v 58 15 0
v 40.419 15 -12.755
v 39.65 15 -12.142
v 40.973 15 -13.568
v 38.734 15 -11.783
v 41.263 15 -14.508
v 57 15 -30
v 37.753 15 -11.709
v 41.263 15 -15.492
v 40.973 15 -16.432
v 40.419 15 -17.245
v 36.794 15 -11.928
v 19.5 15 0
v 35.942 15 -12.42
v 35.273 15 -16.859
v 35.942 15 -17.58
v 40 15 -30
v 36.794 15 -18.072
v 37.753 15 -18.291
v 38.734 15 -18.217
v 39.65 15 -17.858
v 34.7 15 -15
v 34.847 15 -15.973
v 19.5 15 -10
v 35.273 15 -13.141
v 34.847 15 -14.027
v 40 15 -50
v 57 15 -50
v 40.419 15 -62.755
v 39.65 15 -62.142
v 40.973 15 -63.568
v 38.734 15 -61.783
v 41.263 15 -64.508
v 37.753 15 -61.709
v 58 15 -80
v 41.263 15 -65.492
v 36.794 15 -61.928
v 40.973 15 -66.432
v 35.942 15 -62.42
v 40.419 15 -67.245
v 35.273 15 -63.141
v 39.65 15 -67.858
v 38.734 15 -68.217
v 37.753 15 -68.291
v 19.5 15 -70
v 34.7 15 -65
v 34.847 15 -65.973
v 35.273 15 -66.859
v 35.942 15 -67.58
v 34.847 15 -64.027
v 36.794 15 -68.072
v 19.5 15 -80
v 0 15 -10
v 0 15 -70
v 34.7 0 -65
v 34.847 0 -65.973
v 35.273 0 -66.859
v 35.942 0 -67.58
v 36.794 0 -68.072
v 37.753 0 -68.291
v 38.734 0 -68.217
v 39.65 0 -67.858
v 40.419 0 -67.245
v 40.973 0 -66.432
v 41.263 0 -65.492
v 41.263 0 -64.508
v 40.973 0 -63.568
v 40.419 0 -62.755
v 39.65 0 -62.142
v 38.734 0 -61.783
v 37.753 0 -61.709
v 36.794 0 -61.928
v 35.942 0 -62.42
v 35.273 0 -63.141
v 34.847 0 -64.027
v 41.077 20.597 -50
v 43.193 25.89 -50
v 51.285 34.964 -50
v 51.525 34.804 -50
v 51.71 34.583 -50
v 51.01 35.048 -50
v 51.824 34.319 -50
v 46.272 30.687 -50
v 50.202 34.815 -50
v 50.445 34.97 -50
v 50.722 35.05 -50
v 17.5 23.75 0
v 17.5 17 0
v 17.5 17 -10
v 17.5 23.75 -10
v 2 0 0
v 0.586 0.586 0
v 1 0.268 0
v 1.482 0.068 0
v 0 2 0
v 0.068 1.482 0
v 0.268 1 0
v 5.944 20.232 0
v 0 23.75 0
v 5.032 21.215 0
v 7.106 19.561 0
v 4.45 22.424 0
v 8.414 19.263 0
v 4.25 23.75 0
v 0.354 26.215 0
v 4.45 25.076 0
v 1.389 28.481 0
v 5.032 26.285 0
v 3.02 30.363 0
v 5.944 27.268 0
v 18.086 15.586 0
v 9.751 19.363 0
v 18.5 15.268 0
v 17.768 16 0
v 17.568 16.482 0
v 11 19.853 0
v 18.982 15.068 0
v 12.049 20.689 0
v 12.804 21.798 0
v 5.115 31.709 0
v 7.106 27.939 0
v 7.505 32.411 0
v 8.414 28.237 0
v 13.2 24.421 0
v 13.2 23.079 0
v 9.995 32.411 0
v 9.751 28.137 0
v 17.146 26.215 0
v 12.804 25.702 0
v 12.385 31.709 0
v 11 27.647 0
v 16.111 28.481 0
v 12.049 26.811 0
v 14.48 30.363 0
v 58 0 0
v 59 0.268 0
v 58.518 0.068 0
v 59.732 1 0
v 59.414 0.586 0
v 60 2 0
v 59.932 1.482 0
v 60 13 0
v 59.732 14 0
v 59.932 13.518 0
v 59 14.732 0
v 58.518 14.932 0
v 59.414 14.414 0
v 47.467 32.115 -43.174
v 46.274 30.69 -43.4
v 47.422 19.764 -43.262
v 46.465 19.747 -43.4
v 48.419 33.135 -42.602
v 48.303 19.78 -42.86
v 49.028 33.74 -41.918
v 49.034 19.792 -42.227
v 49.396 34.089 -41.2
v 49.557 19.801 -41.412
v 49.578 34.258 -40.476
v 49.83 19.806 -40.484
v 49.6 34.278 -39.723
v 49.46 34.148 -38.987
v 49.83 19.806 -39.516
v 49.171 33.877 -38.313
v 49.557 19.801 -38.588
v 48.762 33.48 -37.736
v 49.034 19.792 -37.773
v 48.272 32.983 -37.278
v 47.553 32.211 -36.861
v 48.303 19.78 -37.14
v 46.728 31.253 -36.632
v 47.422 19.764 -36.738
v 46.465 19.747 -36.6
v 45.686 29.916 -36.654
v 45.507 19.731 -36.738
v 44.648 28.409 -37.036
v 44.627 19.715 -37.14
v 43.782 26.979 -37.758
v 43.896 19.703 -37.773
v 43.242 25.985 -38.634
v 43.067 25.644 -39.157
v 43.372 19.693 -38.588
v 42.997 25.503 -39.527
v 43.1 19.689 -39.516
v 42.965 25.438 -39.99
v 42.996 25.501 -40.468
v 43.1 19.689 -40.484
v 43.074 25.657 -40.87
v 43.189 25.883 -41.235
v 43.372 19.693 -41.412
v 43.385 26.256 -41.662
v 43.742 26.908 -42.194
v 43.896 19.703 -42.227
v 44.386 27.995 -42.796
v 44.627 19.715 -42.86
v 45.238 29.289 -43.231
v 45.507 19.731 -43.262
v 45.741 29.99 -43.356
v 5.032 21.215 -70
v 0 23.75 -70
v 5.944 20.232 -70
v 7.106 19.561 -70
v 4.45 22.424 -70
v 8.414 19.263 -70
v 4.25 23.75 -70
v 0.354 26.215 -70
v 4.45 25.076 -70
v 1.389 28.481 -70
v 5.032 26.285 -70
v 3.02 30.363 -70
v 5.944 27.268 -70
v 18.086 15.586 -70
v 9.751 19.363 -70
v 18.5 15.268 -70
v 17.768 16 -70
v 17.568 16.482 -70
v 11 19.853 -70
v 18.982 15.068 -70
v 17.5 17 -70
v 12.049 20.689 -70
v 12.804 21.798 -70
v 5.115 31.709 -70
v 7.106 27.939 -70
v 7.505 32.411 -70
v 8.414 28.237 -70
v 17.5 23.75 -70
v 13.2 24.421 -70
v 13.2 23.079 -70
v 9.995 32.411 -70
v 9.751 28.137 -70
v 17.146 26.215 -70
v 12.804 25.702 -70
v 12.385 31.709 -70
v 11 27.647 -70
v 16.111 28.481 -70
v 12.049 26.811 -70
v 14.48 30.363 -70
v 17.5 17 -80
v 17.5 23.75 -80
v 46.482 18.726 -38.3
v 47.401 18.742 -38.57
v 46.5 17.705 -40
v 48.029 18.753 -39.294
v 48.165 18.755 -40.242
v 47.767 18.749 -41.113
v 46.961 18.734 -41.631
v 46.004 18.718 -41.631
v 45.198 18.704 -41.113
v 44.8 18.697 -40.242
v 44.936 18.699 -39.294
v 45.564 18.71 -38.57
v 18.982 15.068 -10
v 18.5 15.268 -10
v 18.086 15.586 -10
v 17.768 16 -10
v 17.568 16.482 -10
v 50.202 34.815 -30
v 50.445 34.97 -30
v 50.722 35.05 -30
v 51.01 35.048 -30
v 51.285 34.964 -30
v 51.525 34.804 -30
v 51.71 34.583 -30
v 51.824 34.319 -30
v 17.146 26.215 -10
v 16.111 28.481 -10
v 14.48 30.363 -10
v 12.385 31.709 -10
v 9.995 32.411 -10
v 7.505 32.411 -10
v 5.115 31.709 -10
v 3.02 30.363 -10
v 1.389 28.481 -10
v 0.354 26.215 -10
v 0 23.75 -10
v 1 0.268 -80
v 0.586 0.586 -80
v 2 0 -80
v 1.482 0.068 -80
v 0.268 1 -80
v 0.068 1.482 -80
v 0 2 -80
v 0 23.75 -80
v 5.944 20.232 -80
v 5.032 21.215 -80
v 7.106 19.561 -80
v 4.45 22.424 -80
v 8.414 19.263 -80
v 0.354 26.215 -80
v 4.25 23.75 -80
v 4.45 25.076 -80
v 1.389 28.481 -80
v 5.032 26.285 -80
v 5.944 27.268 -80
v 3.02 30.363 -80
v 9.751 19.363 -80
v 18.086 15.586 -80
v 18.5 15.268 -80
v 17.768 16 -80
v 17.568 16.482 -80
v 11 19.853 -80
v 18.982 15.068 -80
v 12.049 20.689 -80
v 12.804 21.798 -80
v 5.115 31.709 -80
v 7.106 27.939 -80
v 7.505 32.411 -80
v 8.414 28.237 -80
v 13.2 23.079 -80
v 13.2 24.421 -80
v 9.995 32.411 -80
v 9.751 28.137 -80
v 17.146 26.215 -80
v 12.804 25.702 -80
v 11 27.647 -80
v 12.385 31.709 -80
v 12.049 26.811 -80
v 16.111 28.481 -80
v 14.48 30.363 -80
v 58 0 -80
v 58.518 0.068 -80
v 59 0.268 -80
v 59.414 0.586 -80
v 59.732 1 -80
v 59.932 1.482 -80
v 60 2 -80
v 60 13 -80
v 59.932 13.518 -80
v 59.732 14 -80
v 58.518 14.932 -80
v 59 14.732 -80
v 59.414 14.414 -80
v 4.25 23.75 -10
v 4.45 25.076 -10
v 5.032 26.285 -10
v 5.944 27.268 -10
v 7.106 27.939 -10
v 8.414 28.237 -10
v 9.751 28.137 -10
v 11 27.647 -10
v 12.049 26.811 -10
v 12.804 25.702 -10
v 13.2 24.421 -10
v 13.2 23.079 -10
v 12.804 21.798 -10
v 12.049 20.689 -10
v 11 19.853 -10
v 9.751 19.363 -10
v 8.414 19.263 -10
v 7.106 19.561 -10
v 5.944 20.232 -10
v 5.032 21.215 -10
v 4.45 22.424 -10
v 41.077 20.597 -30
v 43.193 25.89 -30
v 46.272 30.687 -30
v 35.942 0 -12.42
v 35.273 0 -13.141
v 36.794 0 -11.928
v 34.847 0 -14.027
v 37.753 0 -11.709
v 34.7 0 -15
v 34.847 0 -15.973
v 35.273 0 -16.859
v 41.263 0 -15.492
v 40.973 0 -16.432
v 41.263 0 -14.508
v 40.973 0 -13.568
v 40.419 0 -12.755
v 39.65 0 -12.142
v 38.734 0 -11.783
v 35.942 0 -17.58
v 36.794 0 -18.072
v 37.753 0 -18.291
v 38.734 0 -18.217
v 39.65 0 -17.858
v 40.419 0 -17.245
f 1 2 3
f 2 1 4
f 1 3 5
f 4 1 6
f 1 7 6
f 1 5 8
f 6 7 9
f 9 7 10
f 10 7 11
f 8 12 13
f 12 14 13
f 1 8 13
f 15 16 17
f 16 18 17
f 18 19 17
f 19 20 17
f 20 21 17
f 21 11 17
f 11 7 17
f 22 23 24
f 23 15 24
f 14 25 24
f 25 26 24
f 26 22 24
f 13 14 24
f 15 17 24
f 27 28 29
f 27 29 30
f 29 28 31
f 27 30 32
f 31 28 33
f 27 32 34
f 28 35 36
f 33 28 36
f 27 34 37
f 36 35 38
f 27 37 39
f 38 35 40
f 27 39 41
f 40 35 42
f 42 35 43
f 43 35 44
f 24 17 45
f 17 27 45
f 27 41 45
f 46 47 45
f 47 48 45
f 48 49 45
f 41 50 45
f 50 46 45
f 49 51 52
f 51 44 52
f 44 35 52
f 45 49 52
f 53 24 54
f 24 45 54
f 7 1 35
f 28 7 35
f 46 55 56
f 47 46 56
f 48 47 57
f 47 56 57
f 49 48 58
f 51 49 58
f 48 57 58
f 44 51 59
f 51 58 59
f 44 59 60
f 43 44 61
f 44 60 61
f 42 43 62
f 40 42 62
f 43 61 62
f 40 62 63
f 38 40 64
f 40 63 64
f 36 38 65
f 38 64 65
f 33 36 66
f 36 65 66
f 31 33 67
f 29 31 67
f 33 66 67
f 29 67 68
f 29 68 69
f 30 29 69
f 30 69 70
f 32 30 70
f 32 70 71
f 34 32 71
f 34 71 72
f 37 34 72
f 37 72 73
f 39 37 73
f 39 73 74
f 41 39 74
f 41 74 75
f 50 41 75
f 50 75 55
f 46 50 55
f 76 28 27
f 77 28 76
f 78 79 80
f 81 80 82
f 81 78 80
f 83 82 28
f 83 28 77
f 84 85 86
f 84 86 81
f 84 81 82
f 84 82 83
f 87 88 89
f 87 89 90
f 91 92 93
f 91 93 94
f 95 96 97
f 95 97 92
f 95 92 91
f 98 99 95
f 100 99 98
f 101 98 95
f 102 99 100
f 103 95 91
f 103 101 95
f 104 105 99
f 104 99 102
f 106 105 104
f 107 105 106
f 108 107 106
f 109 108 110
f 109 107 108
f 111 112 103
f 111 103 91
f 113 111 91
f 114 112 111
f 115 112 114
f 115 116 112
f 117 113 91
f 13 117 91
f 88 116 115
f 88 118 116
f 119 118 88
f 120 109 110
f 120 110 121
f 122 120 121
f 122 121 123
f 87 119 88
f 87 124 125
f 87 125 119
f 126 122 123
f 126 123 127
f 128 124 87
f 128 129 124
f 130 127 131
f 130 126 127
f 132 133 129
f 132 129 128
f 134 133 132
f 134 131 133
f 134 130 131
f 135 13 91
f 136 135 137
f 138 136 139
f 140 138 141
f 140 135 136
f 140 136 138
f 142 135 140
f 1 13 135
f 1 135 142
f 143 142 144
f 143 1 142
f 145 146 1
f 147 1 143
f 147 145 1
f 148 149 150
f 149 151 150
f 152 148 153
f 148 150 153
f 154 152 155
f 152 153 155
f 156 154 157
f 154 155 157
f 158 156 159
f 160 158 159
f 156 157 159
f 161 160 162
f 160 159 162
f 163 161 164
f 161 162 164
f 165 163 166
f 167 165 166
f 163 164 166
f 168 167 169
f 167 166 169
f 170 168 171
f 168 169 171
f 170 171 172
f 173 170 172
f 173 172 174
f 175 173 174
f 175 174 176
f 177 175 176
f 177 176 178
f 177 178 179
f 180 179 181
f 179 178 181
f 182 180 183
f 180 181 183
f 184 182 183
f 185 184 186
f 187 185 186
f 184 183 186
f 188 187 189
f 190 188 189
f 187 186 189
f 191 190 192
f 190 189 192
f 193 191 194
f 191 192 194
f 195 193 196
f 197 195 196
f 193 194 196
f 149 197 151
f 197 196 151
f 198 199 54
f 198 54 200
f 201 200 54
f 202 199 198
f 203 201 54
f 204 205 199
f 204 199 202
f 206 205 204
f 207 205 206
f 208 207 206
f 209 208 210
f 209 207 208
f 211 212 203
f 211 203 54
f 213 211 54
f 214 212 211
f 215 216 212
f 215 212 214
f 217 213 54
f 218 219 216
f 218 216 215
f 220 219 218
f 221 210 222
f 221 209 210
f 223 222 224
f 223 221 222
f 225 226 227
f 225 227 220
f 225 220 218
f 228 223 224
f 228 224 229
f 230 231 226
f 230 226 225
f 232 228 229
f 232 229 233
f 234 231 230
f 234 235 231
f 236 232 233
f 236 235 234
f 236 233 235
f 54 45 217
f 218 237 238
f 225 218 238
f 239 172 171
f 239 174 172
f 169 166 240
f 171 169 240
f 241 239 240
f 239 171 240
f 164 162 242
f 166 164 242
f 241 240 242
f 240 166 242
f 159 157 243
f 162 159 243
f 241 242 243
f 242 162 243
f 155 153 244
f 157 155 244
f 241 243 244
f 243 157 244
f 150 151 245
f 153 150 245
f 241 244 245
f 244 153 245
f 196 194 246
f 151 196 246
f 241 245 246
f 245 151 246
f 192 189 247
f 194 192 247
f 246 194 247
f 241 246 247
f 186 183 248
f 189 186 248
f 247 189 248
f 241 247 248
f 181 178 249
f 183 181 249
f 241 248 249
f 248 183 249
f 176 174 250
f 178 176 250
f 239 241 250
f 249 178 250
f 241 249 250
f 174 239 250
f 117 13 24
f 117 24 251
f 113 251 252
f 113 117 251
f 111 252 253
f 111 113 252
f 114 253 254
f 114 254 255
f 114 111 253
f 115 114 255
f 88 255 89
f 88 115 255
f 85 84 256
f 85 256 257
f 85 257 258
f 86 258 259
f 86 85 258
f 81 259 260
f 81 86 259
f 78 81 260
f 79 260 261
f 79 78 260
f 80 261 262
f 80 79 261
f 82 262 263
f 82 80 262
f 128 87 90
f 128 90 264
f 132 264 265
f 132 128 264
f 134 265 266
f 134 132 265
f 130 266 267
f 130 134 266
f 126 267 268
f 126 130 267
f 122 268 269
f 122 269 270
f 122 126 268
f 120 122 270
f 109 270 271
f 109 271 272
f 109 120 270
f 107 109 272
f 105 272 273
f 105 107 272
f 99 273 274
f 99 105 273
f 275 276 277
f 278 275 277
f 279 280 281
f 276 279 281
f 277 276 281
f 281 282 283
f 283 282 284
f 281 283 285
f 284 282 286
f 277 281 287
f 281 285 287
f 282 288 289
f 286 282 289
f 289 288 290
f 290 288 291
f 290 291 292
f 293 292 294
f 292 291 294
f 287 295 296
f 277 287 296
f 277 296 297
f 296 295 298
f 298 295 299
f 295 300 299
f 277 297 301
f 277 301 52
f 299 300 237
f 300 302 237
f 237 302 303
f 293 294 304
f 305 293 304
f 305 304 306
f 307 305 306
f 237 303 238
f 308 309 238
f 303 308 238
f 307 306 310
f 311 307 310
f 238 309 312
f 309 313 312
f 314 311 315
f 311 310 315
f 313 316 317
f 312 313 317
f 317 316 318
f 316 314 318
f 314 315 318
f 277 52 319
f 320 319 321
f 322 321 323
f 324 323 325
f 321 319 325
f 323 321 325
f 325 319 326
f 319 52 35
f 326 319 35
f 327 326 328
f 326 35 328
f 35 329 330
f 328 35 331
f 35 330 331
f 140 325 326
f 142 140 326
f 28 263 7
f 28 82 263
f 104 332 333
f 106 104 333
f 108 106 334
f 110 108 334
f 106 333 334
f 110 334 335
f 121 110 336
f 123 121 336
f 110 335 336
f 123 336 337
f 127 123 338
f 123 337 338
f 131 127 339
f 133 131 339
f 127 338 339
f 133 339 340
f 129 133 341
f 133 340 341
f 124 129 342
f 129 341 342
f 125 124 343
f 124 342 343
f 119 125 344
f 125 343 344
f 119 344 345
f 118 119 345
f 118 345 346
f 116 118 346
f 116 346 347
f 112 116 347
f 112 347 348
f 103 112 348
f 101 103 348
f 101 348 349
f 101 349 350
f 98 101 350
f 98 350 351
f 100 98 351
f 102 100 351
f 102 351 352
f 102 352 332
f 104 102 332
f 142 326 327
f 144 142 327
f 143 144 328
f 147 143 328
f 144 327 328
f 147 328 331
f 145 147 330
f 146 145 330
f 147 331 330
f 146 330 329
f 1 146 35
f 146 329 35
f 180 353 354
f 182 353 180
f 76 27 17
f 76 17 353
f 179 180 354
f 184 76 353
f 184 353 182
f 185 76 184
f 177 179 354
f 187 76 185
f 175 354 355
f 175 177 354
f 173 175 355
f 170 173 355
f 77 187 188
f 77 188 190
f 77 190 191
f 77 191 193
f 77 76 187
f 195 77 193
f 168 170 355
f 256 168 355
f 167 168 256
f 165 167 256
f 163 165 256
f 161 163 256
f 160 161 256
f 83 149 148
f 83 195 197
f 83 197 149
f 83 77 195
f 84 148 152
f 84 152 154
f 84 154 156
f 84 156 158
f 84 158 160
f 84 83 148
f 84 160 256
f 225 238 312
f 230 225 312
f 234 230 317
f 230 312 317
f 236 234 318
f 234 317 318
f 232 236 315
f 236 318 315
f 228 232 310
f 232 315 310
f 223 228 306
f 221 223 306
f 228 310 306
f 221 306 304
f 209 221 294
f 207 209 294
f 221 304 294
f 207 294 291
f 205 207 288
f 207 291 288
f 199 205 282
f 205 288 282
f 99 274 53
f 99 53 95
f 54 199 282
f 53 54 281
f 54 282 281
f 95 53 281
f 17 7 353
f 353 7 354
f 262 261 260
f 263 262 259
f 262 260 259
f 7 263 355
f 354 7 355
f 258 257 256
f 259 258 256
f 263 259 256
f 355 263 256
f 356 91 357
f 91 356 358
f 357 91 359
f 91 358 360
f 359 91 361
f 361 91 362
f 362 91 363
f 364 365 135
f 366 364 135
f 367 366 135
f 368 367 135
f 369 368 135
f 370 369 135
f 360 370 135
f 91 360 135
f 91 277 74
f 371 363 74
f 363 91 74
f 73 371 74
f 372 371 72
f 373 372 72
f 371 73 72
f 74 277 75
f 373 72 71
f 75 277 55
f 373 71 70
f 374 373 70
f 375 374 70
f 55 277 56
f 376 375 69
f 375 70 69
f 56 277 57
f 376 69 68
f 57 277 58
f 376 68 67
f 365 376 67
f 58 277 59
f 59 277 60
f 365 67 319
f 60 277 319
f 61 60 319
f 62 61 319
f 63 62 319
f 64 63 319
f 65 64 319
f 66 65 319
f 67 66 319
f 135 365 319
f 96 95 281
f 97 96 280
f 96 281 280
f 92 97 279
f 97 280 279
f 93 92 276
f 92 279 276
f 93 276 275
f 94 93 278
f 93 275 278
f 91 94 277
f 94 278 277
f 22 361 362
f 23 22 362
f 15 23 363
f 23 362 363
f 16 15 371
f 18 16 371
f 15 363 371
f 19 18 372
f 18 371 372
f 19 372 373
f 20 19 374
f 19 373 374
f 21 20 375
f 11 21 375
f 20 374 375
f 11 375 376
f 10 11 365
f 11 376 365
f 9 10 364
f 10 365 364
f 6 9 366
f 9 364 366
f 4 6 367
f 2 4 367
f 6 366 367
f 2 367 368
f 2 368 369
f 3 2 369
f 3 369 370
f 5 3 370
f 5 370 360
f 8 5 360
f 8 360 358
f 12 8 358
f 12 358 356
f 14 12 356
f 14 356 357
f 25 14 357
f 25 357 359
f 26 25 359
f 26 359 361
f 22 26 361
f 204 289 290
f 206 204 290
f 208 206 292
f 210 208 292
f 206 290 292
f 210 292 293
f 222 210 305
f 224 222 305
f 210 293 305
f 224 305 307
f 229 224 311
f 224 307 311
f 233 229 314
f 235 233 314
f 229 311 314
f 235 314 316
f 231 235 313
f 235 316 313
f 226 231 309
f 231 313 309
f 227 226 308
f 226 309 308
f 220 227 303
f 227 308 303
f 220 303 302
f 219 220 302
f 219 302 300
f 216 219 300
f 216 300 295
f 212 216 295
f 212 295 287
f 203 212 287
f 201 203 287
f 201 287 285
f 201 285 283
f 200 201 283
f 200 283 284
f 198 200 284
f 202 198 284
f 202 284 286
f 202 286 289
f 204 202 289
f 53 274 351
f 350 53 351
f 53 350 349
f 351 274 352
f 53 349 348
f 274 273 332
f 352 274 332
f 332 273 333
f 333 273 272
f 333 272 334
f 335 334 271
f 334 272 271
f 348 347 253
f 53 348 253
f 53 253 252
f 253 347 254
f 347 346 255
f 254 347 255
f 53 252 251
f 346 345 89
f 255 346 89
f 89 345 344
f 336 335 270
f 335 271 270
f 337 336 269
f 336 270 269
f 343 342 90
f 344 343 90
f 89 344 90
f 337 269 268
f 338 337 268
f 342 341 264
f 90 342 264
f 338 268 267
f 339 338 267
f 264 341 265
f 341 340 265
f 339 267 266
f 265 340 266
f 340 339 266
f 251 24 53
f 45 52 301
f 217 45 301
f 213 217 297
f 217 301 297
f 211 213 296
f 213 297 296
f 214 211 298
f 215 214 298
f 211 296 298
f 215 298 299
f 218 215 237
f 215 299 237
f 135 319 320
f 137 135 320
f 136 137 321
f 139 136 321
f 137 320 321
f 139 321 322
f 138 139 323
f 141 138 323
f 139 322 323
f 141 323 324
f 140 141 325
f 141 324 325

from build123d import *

# Parameters (mm, degrees)
BOSS_EXTRUDE1_DEPTH              = 10
BOSS_EXTRUDE2_DEPTH              = 30
BOSS_EXTRUDE3_DEPTH              = 10
M8_CLEARANCE_HOLE1_D             = 9
TAP_DRILL_FOR_M8X1_25_TAP1_D     = 6.8
TAP_DRILL_FOR_M8X1_25_TAP1_DEPTH = 15
TAP_DRILL_FOR_M8X1_25_TAP1_TIP   = 2.042926105
M6_CLEARANCE_HOLE1_D             = 6.6


with BuildPart() as part:
    # Sketch1 → Boss-Extrude1 (new body)
    with BuildSketch(Plane.XY):
        with BuildLine():
            Line((2, 0), (58, 0))
            ThreePointArc((58, 0), (59.414213562, 0.585786438), (60, 2))
            Line((60, 2), (60, 13))
            ThreePointArc((60, 13), (59.414213562, 14.414213562), (58, 15))
            Line((58, 15), (19.5, 15))
            ThreePointArc((19.5, 15), (18.085786438, 15.585786438), (17.5, 17))
            Line((17.5, 17), (17.5, 23.75))
            ThreePointArc((17.5, 23.75), (8.75, 32.5), (0, 23.75))
            Line((0, 23.75), (0, 2))
            ThreePointArc((0, 2), (0.585786438, 0.585786438), (2, 0))
        make_face()
    boss_extrude1 = extrude(amount=-BOSS_EXTRUDE1_DEPTH)

    # Sketch2 → Boss-Extrude2 (add)
    with BuildSketch(Plane(origin=(0, 0, -10), x_dir=(-1, 0, 0), z_dir=(0, 0, -1))):
        with BuildLine():
            Line((-58, 0), (-2, 0))
            ThreePointArc((-2, 0), (-0.585786438, 0.585786438), (0, 2))
            Line((0, 2), (0, 15))
            Line((0, 15), (-58, 15))
            ThreePointArc((-58, 15), (-59.414213562, 14.414213562), (-60, 13))
            Line((-60, 13), (-60, 2))
            ThreePointArc((-60, 2), (-59.414213562, 0.585786438), (-58, 0))
        make_face()
    boss_extrude2 = extrude(amount=BOSS_EXTRUDE2_DEPTH)

    # Mirror2: Boss-Extrude2 across plane
    add(boss_extrude2.mirror(Plane(origin=(0, 0, -40), x_dir=(1, 0, 0), z_dir=(0, 0, -1))))

    # Mirror3: Boss-Extrude1 across plane
    add(boss_extrude1.mirror(Plane(origin=(0, 0, -40), x_dir=(1, 0, 0), z_dir=(0, 0, -1))))

    # Sketch3 → Boss-Extrude3 (add, symmetric)
    with BuildSketch(Plane(origin=(0, 0, -40), x_dir=(-1, 0, 0), z_dir=(0, 0, -1))):
        with BuildLine():
            Line((-57, 15), (-40, 15))
            ThreePointArc((-40, 15), (-43.192782494, 25.890045982), (-50.202268973, 34.814958355))
            ThreePointArc((-50.202268973, 34.814958355), (-51.150466942, 35.015879251), (-51.823619098, 34.318516526))
            Line((-51.823619098, 34.318516526), (-57, 15))
        make_face()
    extrude(amount=BOSS_EXTRUDE3_DEPTH, both=True)

    # M8 Clearance Hole1 (through all)
    with Locations(Plane.XY):
        with Locations((8.75, 23.75)):
            Hole(M8_CLEARANCE_HOLE1_D / 2)

    # Tap Drill for M8x1.25 Tap1
    with Locations(Plane(origin=(-0.592221329, 33.928337229, 0), x_dir=(0, 0, 1), z_dir=(-0.017452406437290298, 0.9998476951563912, 0))):
        with Locations((-40, 46.802227727)):
            Hole(TAP_DRILL_FOR_M8X1_25_TAP1_D / 2, depth=TAP_DRILL_FOR_M8X1_25_TAP1_DEPTH)
            with Locations((0, 0, -(TAP_DRILL_FOR_M8X1_25_TAP1_DEPTH + TAP_DRILL_FOR_M8X1_25_TAP1_TIP / 2))):  # 118° drill point
                Cone(0, TAP_DRILL_FOR_M8X1_25_TAP1_D / 2, TAP_DRILL_FOR_M8X1_25_TAP1_TIP, mode=Mode.SUBTRACT)

    # M6 Clearance Hole1 (through all)
    with Locations(Plane(origin=(0, 15, 0), x_dir=(1, 0, 0), z_dir=(0, 1, 0))):
        with Locations((38, 15), (38, 65)):
            Hole(M6_CLEARANCE_HOLE1_D / 2)


solid = part.part
